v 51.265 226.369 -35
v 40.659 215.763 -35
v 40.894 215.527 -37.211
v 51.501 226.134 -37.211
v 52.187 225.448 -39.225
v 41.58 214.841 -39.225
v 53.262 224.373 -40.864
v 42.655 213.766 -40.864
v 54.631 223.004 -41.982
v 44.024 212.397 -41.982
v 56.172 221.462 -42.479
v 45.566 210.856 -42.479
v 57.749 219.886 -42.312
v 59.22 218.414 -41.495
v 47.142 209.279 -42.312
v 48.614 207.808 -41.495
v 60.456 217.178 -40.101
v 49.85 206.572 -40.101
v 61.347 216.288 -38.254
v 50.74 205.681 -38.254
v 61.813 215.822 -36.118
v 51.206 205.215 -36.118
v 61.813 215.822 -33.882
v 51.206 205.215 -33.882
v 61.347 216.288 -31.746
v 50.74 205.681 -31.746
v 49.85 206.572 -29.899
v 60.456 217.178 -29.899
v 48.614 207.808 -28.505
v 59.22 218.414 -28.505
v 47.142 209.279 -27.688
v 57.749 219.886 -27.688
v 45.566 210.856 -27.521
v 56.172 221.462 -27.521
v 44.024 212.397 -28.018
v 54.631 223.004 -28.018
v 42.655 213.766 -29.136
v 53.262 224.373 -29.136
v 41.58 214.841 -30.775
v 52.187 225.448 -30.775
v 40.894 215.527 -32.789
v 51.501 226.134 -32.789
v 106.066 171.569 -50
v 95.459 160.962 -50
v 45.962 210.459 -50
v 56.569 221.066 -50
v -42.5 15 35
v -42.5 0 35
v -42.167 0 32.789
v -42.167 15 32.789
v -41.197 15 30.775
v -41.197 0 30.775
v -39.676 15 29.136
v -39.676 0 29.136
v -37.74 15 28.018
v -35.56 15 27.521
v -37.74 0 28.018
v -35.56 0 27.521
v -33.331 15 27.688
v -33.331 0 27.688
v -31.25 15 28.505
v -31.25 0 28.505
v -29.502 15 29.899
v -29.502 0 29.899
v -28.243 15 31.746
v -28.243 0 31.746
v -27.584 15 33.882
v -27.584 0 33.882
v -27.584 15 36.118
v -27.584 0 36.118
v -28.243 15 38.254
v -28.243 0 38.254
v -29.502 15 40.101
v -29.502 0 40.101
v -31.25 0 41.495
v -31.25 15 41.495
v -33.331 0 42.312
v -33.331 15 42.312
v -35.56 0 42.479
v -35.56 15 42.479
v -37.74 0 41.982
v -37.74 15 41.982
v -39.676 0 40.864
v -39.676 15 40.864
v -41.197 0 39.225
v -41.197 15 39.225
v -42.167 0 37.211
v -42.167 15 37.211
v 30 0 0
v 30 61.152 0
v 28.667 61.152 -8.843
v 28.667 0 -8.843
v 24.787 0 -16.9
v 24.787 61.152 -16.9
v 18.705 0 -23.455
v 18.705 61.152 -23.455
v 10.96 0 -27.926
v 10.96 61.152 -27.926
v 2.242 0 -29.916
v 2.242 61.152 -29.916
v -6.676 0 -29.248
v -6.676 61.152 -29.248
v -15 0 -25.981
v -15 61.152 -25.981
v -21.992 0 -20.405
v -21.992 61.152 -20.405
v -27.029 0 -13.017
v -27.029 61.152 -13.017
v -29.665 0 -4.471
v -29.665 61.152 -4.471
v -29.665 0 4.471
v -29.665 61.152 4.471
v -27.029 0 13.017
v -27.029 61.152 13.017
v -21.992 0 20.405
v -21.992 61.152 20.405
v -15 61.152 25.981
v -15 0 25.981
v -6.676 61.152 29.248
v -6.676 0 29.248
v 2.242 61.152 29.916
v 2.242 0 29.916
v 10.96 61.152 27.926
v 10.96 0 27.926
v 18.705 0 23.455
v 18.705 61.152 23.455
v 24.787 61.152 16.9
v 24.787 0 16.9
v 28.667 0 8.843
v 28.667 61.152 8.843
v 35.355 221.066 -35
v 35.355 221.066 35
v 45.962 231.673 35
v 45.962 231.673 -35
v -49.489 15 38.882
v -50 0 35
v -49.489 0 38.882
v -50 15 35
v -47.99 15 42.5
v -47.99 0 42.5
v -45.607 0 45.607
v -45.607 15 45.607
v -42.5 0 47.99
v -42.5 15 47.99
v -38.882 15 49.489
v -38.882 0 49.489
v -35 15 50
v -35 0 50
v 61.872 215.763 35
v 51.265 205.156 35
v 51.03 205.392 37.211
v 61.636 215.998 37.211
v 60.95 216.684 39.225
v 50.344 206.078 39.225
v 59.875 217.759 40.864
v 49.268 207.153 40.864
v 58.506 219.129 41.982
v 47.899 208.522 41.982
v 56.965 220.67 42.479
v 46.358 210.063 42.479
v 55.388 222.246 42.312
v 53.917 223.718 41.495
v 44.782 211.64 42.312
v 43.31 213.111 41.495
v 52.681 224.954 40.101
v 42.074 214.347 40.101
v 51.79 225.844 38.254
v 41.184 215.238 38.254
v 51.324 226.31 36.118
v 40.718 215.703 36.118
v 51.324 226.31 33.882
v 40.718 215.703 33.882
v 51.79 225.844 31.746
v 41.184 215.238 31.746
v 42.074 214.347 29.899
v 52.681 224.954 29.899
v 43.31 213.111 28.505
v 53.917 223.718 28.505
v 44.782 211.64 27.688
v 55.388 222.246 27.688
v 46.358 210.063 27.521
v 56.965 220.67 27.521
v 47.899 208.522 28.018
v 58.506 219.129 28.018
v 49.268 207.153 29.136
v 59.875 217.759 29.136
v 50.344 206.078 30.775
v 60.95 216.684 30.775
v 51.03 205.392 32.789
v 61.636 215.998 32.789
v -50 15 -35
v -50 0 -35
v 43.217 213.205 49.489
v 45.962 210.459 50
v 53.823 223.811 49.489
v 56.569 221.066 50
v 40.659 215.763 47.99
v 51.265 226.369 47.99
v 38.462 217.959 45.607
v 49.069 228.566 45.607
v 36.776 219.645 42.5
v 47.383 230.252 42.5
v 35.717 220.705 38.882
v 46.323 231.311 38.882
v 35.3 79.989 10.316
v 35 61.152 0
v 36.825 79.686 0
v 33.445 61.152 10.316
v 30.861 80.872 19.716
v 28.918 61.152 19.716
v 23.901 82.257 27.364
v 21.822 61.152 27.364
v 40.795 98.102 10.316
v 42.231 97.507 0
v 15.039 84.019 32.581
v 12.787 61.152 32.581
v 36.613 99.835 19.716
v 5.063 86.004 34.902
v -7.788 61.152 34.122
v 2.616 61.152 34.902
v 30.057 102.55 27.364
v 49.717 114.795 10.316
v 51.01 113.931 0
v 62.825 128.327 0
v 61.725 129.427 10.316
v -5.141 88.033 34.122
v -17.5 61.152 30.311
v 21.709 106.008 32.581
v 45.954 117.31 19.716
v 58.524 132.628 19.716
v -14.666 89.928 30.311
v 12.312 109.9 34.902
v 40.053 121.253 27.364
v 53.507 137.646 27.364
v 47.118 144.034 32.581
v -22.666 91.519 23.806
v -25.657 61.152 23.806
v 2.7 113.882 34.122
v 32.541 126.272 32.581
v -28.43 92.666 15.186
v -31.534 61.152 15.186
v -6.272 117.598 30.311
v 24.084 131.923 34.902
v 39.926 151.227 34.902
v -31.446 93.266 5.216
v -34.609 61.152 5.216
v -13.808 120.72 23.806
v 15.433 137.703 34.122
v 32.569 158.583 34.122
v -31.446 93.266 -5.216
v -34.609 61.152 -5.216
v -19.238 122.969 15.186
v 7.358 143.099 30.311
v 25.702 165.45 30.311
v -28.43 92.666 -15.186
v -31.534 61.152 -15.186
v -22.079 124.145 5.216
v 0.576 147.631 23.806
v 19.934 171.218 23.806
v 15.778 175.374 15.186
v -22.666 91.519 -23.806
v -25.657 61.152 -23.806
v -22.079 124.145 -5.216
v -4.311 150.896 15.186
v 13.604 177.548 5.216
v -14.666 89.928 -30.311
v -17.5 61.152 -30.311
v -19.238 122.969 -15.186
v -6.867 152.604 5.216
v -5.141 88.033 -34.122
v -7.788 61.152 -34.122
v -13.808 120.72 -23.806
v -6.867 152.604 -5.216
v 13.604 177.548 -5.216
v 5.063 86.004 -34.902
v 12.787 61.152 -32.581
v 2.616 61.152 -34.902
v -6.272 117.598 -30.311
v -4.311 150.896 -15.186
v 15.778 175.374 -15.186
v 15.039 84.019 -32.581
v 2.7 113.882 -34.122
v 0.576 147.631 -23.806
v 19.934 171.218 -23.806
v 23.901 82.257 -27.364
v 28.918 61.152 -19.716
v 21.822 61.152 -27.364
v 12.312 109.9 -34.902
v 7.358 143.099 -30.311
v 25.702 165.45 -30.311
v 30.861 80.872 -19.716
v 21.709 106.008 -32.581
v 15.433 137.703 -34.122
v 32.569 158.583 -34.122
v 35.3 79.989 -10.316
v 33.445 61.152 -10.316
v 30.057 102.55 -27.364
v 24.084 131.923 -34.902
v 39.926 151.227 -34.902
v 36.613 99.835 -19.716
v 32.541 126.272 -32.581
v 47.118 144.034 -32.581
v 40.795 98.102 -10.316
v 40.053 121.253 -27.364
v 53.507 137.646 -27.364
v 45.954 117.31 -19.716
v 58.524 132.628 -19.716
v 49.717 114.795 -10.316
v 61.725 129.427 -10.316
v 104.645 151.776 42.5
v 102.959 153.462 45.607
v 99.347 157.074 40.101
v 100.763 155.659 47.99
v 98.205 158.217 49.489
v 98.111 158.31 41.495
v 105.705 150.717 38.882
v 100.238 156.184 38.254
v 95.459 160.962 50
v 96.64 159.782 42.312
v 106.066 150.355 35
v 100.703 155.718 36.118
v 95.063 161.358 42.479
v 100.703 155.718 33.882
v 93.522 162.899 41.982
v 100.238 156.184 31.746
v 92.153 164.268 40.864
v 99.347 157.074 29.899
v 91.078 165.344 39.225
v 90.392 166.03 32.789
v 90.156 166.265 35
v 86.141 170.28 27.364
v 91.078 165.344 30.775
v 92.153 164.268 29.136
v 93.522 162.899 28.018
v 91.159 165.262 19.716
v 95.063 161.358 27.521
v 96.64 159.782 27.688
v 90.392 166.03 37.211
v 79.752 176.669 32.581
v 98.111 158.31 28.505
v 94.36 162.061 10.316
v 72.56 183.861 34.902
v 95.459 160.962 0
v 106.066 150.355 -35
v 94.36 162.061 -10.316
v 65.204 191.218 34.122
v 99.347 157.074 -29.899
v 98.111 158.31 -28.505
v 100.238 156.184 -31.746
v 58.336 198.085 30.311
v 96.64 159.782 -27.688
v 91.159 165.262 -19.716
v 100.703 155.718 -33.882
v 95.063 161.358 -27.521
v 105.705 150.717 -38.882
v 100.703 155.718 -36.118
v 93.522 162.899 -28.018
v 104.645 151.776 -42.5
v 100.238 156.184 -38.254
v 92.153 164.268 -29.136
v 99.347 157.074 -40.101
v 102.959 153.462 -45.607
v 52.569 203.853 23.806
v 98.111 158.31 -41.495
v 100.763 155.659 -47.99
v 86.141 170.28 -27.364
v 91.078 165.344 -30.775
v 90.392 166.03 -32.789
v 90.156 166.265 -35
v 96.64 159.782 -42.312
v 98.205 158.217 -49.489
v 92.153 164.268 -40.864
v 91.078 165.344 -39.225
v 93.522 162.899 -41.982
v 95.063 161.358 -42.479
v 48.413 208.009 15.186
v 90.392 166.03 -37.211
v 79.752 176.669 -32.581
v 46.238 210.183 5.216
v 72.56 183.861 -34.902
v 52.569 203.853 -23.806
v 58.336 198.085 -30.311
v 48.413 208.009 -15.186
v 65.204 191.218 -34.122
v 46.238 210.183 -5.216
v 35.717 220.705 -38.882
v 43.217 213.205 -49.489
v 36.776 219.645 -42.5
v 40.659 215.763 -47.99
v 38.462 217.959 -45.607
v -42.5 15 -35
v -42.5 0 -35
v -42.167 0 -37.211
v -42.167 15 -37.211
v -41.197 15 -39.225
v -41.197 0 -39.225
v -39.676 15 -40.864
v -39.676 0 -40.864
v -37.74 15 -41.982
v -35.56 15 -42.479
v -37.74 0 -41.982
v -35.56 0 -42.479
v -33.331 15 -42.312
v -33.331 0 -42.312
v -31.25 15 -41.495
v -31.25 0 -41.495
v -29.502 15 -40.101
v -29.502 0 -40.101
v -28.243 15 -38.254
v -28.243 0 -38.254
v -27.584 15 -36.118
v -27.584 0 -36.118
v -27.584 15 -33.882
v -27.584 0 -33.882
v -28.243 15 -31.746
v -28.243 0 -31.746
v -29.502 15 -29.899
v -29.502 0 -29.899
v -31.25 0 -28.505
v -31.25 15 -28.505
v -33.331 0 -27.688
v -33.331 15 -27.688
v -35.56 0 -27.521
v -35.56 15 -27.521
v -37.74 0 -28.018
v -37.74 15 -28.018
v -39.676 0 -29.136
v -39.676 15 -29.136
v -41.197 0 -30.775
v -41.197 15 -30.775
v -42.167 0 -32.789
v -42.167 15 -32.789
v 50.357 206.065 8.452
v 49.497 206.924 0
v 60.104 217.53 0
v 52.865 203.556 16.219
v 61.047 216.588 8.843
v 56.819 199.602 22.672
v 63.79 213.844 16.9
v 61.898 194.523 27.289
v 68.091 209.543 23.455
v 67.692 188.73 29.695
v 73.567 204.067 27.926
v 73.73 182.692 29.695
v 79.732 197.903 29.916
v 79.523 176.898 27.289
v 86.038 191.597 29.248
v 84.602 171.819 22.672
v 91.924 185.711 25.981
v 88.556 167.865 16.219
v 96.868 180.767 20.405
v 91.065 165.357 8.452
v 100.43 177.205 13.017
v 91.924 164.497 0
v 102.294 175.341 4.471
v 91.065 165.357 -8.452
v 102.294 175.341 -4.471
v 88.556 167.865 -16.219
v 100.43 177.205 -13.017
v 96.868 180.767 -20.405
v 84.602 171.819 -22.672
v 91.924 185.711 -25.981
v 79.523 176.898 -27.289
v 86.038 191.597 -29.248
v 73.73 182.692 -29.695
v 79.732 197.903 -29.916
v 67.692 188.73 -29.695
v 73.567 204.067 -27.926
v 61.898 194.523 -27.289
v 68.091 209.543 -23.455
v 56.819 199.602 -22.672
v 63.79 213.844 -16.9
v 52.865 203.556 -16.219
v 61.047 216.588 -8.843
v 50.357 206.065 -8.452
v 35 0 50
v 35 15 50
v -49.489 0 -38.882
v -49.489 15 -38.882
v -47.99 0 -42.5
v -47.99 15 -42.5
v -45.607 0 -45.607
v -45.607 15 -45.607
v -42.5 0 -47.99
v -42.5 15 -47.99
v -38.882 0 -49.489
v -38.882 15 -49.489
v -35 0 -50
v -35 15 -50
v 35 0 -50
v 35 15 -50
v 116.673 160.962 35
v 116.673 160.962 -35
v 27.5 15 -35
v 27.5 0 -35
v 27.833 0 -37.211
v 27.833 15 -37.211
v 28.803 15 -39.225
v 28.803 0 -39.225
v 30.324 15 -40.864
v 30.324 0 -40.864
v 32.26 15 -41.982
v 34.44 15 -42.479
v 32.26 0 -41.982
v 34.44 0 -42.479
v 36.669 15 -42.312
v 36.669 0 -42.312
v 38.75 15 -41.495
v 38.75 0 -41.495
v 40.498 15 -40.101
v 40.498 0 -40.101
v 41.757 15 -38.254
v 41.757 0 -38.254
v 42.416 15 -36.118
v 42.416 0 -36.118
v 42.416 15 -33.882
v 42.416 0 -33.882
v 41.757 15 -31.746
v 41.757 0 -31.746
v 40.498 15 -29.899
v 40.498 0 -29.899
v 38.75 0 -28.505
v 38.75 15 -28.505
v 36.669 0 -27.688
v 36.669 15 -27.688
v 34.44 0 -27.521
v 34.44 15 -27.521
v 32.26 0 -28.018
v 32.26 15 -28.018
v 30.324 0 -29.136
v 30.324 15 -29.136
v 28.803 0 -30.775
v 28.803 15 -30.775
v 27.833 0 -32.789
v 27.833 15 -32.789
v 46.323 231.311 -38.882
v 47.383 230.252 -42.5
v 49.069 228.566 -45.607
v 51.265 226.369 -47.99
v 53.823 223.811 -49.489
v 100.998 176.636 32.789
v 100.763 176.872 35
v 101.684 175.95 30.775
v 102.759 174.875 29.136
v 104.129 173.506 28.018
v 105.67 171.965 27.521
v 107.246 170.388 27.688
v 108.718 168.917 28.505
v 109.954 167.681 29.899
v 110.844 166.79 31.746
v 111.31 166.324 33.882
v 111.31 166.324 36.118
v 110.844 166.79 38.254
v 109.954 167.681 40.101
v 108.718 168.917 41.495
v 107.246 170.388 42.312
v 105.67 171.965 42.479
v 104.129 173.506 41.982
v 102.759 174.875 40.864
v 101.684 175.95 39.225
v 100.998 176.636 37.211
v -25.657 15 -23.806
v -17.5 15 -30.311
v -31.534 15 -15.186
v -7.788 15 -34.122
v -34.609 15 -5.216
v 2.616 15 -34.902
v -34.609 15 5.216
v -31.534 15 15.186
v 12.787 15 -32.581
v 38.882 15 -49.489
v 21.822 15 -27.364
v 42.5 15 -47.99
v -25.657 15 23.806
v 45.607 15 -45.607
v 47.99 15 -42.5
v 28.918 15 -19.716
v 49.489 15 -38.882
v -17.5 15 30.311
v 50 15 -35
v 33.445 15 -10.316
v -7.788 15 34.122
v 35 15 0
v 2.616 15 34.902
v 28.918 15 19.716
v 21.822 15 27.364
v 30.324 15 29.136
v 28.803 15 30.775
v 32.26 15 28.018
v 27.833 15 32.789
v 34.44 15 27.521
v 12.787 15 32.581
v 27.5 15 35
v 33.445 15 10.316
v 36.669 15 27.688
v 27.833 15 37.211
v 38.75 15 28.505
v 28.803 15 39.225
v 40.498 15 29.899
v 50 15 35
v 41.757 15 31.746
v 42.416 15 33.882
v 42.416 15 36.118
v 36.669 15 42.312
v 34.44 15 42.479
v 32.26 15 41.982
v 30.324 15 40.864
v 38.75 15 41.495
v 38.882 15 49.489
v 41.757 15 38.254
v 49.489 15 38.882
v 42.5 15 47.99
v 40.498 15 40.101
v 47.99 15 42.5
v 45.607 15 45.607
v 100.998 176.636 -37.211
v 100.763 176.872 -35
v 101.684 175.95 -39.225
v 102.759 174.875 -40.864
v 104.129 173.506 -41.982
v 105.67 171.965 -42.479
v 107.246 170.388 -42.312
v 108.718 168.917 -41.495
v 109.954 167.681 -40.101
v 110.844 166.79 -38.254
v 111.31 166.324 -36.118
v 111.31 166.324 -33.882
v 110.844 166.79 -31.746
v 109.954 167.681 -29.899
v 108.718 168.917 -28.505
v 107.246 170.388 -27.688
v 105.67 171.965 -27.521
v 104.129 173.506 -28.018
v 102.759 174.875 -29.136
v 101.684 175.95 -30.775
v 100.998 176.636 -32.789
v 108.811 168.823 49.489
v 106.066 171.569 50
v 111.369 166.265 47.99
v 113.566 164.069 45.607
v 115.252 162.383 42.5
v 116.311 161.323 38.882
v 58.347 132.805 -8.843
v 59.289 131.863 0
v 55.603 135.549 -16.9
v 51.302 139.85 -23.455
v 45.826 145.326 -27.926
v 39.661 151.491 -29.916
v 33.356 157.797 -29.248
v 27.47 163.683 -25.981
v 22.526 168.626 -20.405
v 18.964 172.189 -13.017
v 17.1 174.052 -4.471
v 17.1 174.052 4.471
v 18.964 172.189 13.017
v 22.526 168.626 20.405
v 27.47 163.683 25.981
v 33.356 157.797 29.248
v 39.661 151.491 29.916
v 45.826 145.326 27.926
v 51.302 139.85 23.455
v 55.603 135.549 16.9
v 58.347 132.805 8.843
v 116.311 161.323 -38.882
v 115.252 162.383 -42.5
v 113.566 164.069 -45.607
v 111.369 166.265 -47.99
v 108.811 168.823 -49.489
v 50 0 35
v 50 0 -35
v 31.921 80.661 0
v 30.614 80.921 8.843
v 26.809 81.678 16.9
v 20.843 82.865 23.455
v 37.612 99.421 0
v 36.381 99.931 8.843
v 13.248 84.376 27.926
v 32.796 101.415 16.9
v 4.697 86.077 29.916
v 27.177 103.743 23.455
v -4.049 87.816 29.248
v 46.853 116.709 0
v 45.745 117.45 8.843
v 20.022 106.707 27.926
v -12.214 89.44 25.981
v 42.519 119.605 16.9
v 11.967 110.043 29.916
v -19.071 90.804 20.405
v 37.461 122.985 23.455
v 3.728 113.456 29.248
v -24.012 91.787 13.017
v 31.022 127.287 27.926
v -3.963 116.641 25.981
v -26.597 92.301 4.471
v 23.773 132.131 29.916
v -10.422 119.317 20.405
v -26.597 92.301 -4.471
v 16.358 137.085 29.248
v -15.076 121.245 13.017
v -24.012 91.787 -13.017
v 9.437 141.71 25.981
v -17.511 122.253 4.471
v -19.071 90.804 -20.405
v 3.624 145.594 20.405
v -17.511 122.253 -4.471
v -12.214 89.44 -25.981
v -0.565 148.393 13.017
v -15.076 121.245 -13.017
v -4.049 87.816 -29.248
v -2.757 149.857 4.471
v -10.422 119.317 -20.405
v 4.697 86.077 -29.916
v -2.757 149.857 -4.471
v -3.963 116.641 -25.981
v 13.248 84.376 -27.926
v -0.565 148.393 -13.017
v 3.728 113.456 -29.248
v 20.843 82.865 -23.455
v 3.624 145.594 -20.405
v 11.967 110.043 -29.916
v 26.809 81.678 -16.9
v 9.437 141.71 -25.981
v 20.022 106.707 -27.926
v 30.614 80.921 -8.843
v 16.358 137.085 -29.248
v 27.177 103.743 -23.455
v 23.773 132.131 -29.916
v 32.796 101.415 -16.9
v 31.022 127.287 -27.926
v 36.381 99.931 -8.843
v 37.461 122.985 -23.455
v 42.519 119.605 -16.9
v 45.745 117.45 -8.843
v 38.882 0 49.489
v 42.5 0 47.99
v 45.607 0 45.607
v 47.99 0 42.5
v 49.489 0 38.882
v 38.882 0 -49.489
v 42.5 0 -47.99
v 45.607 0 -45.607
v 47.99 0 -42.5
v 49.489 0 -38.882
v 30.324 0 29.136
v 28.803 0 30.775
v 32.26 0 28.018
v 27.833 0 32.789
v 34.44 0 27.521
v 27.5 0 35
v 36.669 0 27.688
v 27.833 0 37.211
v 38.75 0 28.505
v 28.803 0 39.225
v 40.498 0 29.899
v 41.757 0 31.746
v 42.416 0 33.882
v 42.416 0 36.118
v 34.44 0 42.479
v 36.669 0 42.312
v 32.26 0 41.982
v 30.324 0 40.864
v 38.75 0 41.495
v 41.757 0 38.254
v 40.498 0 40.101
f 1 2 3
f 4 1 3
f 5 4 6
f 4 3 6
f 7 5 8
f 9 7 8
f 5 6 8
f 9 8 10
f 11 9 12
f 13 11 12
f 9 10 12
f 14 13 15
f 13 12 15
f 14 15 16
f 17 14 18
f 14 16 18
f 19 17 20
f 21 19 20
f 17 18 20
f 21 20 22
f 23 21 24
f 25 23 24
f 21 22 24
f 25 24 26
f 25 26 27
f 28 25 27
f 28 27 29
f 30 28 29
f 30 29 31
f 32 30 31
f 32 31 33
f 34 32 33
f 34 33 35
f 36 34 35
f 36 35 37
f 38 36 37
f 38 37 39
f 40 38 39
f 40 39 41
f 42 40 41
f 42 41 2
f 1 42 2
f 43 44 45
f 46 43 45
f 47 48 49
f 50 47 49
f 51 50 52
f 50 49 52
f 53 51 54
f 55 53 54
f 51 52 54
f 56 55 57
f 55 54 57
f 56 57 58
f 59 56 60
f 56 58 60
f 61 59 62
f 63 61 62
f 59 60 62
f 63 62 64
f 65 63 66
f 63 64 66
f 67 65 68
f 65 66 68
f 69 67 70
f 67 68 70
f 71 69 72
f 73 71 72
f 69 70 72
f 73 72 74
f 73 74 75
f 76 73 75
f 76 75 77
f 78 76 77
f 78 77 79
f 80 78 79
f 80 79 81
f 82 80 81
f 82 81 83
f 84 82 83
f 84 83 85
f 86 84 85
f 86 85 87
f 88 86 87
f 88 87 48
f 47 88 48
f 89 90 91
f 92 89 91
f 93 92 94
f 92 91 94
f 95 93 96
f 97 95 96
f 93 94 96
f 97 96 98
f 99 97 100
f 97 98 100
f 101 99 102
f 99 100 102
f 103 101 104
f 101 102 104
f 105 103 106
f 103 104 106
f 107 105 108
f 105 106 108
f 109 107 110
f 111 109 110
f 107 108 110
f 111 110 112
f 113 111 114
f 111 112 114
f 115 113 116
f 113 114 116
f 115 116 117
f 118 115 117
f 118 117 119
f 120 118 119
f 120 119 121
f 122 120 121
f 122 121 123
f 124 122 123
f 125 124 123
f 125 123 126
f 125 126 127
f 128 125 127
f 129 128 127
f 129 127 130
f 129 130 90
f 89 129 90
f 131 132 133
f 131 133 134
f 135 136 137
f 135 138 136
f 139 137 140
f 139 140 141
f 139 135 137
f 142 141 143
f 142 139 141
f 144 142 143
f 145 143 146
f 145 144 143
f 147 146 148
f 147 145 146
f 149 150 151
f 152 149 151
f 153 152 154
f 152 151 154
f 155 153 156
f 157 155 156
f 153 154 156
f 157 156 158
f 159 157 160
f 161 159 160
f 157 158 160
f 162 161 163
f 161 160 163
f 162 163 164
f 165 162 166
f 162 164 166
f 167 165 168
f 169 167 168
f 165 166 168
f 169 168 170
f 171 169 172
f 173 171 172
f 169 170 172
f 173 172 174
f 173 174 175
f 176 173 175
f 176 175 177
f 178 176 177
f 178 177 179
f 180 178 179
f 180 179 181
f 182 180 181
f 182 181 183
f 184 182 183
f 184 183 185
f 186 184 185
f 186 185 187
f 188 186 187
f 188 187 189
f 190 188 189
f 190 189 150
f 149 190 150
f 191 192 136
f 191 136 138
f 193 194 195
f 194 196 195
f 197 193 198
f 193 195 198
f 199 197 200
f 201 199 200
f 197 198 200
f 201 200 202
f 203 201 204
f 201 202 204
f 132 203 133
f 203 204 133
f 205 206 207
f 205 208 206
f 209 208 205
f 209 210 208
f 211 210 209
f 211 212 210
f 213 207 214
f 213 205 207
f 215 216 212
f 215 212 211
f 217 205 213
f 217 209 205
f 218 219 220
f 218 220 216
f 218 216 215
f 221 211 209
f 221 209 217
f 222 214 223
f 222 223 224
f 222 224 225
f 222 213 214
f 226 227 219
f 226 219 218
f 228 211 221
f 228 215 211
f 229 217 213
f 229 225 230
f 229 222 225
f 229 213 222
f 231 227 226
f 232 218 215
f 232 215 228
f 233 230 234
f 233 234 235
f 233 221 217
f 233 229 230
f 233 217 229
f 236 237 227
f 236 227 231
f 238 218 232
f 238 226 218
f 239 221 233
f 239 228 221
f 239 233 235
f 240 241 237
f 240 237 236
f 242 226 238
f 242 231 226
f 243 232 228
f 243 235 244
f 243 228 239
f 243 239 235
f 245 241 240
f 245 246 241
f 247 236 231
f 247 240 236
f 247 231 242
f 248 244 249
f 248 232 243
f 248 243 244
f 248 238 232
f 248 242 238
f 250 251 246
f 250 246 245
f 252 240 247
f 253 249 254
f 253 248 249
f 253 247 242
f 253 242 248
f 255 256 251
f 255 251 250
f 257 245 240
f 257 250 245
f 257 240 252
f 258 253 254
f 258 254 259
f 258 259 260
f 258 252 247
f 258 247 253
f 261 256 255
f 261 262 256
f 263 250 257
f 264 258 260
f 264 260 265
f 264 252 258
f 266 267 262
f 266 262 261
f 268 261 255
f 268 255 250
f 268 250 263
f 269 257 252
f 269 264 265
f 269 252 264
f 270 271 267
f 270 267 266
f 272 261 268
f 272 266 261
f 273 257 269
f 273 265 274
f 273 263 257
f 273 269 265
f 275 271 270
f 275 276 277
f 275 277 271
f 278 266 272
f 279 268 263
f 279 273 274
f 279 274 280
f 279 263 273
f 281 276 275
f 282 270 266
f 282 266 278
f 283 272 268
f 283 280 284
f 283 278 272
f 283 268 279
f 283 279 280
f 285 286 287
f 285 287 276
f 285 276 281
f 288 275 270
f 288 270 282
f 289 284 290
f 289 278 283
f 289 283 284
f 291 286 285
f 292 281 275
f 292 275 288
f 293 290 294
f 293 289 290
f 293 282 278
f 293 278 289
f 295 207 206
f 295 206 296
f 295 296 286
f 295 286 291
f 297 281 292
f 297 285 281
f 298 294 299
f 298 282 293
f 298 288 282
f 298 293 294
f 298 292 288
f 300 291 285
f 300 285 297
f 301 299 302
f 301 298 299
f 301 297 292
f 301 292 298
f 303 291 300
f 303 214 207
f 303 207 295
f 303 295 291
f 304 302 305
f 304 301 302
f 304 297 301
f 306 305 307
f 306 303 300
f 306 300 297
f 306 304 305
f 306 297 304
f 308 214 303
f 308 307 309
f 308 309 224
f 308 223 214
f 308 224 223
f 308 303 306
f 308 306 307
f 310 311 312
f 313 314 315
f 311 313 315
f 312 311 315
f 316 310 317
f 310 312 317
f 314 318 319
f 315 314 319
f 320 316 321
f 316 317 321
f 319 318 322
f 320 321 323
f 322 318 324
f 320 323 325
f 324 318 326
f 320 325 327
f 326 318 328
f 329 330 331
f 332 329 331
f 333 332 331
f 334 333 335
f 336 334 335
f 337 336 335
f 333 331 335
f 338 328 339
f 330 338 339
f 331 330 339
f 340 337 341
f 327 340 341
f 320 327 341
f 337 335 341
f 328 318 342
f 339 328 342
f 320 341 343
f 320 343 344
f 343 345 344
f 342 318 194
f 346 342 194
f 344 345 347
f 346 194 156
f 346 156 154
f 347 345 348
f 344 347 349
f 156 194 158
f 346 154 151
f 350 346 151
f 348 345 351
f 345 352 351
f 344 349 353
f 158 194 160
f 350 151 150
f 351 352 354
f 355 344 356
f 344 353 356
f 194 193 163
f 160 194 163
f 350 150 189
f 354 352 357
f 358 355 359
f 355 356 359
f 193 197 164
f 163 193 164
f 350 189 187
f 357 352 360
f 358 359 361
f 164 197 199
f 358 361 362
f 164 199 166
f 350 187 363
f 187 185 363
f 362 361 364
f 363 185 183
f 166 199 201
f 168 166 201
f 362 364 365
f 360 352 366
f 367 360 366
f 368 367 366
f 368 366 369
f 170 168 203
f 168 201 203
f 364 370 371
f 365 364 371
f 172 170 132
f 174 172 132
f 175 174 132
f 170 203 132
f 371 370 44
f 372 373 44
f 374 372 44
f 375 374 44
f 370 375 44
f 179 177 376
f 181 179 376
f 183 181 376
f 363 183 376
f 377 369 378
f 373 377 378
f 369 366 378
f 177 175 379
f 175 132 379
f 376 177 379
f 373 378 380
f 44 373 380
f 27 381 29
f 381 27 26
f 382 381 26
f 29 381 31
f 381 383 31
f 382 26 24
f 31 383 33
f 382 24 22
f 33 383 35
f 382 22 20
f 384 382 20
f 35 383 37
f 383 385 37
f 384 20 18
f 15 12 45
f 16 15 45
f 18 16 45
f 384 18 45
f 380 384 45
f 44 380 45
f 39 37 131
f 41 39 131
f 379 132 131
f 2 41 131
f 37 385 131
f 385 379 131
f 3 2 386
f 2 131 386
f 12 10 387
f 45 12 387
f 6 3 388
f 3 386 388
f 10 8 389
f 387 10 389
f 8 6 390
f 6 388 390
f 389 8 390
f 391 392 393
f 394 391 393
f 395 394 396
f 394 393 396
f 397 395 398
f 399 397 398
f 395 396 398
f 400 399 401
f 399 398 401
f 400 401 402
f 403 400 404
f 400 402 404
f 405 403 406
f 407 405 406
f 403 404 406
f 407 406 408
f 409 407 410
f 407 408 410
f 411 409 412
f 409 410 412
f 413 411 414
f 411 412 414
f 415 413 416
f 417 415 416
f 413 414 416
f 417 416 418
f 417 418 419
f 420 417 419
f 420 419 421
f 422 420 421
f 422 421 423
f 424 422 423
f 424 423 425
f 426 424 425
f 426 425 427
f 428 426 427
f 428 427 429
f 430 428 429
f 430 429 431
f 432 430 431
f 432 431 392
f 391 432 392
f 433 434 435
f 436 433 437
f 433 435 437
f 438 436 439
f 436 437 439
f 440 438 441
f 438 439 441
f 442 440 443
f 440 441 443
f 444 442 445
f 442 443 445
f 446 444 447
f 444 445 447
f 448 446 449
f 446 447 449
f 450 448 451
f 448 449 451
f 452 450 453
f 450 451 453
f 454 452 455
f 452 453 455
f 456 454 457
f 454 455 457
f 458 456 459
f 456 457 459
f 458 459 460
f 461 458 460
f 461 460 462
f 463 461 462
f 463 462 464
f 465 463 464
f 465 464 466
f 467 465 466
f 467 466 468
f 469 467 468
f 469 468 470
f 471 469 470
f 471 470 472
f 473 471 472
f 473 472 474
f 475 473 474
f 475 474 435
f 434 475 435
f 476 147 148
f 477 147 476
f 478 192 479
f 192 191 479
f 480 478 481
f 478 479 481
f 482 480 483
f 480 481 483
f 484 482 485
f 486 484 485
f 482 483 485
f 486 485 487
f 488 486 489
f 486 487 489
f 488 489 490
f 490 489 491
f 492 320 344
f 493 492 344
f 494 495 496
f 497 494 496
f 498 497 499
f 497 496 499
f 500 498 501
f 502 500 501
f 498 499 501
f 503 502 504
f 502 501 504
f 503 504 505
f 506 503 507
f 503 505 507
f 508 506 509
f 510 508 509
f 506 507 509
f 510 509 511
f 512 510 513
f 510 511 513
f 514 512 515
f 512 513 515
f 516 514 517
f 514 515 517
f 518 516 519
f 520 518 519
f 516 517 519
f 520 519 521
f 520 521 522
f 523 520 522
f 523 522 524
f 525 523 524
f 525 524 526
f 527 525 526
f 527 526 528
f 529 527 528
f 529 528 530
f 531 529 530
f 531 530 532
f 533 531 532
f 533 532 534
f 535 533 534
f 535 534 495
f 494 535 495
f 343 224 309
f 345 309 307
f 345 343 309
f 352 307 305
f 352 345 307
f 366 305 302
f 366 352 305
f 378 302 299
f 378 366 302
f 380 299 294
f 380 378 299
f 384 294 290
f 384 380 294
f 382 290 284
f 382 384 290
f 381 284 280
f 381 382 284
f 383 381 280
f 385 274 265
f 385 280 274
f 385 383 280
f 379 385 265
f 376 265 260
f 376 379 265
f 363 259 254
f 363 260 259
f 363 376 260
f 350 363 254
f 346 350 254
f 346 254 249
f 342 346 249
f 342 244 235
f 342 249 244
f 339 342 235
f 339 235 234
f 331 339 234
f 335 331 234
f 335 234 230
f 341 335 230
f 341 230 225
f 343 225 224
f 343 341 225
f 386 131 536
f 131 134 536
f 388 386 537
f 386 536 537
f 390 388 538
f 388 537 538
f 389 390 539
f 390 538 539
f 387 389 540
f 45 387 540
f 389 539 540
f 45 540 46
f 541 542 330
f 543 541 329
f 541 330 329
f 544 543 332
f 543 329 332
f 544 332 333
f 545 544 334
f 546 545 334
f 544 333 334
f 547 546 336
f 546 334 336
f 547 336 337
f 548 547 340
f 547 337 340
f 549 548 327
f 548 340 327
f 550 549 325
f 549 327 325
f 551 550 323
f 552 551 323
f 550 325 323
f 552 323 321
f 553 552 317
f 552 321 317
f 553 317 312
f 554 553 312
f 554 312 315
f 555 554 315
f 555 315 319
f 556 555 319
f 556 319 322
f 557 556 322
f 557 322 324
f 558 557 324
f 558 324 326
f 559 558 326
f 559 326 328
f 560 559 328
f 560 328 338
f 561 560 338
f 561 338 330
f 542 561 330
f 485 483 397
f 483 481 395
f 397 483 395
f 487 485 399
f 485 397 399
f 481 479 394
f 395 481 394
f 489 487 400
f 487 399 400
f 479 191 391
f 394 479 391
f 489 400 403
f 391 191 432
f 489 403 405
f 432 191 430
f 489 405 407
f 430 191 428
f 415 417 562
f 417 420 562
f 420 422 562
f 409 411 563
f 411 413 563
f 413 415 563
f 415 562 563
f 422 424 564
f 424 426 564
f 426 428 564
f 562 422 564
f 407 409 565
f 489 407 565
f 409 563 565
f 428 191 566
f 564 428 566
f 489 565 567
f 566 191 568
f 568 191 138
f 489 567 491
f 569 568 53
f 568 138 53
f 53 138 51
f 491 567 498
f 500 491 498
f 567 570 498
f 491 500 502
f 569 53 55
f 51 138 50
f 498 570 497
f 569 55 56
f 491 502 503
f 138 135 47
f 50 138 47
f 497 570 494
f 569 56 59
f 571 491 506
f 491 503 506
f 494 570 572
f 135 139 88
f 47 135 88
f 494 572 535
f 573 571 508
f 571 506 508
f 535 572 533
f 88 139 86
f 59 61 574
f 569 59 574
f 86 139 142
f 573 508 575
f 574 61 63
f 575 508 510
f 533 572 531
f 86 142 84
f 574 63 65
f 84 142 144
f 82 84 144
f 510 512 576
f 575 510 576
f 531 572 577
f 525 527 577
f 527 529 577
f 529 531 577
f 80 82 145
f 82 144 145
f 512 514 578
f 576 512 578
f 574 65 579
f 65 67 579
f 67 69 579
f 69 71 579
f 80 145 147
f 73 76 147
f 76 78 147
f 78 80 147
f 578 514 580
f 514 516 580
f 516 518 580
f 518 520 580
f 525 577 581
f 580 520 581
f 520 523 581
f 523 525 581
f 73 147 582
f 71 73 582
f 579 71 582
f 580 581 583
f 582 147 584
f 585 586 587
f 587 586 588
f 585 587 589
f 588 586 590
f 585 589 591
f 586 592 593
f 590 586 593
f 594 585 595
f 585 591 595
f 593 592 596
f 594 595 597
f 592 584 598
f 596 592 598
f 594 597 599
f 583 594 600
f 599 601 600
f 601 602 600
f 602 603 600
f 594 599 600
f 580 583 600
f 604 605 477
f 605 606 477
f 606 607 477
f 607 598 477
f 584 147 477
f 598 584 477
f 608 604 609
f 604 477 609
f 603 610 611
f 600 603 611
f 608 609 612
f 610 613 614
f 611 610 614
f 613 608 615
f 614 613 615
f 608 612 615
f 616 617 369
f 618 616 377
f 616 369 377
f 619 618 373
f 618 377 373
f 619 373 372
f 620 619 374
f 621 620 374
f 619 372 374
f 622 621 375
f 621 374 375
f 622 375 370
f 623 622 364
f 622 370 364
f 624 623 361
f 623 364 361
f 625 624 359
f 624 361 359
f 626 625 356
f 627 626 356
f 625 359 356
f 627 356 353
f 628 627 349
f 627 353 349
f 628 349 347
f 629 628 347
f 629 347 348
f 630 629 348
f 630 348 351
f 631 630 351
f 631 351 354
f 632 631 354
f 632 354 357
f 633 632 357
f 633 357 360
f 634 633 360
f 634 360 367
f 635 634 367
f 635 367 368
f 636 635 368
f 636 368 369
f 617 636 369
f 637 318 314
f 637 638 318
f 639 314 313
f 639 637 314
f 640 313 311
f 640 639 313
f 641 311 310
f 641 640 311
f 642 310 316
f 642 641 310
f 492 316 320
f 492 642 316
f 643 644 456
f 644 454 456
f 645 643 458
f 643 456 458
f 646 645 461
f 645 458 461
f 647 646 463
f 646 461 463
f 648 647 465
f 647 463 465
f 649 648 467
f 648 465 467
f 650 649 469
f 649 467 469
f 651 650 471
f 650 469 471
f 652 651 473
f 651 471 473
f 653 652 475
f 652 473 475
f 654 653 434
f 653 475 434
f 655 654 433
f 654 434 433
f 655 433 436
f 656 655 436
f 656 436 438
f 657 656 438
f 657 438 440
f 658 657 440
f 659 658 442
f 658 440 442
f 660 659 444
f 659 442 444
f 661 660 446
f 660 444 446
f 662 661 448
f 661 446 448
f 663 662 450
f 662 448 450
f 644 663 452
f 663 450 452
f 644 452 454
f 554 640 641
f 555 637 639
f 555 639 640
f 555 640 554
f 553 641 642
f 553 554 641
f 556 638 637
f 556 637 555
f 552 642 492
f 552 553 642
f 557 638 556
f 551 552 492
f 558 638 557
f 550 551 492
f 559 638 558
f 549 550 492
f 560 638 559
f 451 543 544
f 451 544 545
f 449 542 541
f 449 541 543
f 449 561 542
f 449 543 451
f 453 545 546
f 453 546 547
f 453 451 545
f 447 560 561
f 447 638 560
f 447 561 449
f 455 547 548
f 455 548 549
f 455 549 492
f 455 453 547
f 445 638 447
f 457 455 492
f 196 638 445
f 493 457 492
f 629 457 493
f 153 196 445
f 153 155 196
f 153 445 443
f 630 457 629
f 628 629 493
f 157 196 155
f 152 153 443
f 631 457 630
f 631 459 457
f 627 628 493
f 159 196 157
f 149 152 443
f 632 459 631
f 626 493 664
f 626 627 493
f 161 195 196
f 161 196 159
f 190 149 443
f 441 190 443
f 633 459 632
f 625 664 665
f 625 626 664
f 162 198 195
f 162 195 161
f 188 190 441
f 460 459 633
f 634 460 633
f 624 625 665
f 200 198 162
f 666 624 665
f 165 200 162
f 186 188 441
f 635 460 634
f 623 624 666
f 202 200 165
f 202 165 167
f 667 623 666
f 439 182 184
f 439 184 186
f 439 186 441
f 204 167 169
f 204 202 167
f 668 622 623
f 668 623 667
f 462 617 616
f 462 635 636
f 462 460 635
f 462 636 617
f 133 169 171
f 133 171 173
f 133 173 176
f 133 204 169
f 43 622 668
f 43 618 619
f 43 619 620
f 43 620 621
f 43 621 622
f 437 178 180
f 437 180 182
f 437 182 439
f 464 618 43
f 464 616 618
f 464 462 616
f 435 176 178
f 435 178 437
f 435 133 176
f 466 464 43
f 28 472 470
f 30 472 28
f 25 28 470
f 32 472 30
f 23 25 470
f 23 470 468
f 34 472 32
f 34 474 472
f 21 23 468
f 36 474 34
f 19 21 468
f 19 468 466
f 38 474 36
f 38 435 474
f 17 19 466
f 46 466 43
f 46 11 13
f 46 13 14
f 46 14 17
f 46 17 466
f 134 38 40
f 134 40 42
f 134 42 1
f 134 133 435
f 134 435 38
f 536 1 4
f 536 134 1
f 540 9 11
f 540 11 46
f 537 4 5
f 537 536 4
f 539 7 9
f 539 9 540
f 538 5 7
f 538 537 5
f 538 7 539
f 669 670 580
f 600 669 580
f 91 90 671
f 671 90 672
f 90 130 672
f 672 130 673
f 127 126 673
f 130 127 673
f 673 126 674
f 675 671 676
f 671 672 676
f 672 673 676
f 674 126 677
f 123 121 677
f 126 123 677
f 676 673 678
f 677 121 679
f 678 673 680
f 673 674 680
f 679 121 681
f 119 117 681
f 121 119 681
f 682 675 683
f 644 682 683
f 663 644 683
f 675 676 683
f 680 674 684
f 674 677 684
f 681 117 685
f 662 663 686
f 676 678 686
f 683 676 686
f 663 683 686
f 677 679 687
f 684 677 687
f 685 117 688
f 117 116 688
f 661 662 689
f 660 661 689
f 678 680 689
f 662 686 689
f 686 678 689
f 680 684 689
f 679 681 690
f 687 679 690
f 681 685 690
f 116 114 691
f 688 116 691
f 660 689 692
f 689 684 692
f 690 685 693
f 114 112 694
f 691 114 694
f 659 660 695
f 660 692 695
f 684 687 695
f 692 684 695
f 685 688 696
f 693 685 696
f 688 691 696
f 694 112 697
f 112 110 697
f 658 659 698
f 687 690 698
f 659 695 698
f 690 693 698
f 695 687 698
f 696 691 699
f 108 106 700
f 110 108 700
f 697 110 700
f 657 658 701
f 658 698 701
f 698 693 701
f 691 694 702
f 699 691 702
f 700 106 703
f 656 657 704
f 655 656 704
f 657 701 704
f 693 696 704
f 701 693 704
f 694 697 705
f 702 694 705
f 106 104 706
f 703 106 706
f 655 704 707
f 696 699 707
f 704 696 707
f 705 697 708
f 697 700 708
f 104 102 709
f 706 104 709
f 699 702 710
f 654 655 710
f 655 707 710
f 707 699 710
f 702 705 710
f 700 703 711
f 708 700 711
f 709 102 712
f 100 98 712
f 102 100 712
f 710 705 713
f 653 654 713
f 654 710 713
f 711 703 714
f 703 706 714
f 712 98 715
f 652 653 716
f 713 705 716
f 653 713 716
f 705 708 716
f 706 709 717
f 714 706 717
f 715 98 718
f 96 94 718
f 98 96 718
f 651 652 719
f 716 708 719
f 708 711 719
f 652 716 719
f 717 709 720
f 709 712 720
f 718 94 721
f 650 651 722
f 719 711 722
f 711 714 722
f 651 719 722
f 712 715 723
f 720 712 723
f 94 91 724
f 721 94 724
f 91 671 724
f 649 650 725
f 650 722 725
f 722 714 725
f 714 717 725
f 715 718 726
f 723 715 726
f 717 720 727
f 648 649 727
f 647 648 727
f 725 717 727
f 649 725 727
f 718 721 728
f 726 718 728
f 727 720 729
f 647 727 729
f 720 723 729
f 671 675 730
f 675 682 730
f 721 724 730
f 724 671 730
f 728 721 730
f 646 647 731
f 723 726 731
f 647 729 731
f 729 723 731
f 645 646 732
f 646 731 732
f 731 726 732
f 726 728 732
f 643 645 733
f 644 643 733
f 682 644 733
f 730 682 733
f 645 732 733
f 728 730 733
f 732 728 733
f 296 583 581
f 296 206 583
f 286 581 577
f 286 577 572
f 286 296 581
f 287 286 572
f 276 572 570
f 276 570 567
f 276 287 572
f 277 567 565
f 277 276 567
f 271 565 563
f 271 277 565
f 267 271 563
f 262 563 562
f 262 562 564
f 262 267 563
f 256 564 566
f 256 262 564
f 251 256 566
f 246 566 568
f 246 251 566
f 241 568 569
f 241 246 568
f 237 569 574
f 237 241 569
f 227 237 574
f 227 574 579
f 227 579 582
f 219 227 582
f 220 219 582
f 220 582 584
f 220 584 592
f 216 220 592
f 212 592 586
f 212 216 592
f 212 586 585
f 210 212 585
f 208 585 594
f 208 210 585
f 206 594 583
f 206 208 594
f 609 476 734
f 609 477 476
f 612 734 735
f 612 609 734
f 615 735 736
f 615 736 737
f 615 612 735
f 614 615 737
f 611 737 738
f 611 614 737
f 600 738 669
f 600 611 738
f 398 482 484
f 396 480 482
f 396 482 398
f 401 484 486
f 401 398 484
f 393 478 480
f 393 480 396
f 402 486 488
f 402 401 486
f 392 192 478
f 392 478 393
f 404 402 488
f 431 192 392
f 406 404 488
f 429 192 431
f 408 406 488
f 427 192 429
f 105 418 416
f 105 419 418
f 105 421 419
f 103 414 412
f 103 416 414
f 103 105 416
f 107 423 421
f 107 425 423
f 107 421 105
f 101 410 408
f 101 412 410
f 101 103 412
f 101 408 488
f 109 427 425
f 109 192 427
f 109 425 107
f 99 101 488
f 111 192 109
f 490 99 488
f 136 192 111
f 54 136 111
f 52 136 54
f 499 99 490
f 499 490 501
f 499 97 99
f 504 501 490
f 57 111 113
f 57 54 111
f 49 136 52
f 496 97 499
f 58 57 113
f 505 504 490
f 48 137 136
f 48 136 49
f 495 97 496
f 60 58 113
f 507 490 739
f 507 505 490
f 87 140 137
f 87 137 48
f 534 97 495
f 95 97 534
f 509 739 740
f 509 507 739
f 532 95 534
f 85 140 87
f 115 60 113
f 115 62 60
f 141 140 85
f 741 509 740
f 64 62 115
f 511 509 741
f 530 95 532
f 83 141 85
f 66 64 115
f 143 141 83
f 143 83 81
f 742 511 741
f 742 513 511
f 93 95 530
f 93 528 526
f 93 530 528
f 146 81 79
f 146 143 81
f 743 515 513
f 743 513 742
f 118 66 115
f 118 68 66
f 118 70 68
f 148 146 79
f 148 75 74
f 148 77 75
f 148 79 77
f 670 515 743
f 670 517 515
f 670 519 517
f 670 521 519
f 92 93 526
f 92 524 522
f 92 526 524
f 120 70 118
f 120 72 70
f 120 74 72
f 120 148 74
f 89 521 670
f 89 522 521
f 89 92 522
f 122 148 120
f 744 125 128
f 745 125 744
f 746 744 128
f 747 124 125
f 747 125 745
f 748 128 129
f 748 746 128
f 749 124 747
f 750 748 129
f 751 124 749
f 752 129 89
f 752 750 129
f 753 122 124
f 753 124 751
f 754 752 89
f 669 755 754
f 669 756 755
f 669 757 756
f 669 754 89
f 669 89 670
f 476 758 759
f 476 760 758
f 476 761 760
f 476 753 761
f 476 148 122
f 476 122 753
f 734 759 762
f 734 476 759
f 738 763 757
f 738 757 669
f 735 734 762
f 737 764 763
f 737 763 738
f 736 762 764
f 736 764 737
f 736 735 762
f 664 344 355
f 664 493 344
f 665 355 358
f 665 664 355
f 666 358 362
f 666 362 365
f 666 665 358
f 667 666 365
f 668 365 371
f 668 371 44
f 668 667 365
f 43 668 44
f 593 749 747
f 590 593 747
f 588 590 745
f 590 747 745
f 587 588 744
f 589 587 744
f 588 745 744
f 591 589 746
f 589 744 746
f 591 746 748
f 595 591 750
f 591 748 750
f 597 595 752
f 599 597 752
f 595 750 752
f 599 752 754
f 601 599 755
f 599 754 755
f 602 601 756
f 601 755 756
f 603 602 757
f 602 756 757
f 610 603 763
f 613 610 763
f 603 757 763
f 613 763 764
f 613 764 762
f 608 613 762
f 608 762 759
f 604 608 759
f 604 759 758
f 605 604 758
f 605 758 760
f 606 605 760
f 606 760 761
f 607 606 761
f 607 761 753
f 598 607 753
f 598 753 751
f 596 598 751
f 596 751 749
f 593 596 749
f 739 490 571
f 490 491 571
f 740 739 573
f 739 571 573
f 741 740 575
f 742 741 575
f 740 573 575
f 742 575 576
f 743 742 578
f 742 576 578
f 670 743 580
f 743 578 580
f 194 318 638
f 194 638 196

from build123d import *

# Parameters (mm, degrees)
CROQUIS1_W               = 100
CROQUIS1_H               = 15
SALIENTE_EXTRUIR1_DEPTH  = 50
CROQUIS17_R              = 30
CORTAR_EXTRUIR1_DEPTH    = 15
BARRER1_PROFILE_R        = 35
CORTAR_BARRER2_PROFILE_R = 30
REDONDEO1_R              = 15
TALADRO1_D               = 15
TALADRO1_DEPTH           = 15
CROQUIS26_W              = 100
CROQUIS26_H              = 100
SALIENTE_EXTRUIR3_DEPTH  = 15
REDONDEO2_R              = 15
CROQUIS29_R              = 30
CORTAR_EXTRUIR2_DEPTH    = 15
TALADRO2_D               = 15
TALADRO2_DEPTH           = 15
TALADRO2_ON_FACE_2_D     = 15
TALADRO2_ON_FACE_2_DEPTH = 15


with BuildPart() as part:
    # Croquis1 → Saliente-Extruir1 (new, symmetric)
    with BuildSketch(Plane.XY):
        with Locations((0, 7.5)):
            Rectangle(CROQUIS1_W, CROQUIS1_H)
    extrude(amount=SALIENTE_EXTRUIR1_DEPTH, both=True)

    # Croquis17 → Cortar-Extruir1 (cut)
    with BuildSketch(Plane(origin=(0, 15, 0), x_dir=(1, 0, 0), z_dir=(0, 1, 0))):
        with Locations(Location((0, 0, 0), (0, 0, 180))):
            Circle(CROQUIS17_R)
    extrude(amount=-CORTAR_EXTRUIR1_DEPTH, mode=Mode.SUBTRACT)

    # Barrer1: sweep along a path in Croquis2
    with BuildLine(Plane.XY) as barrer1_path:
        Line((0, 0), (0, 61.152236891))
        ThreePointArc((0, 61.152236891), (9.895660774, 110.901083099), (38.076118446, 153.076118446))
        Line((38.076118446, 153.076118446), (70.710678119, 185.710678119))
    # Barrer1 profile (on start of the path) → Barrer1 (sweep)
    with BuildSketch(Plane(origin=(0, 0, 0), x_dir=(1, 0, 0), z_dir=(0, 1, 0))):
        Circle(BARRER1_PROFILE_R)
    sweep(path=barrer1_path.line)

    # Cortar-Barrer2: sweep along a path in Croquis2<5>
    with BuildLine(Plane.XY) as cortar_barrer2_path:
        Line((0, 0), (0, 61.152236891))
        ThreePointArc((0, 61.152236891), (9.895660774, 110.901083099), (38.076118446, 153.076118446))
        Line((38.076118446, 153.076118446), (70.710678119, 185.710678119))
    # Cortar-Barrer2 profile (on start of the path) → Cortar-Barrer2 (sweep, cut)
    with BuildSketch(Plane(origin=(0, 0, 0), x_dir=(1, 0, 0), z_dir=(0, 1, 0))):
        Circle(CORTAR_BARRER2_PROFILE_R)
    sweep(path=cortar_barrer2_path.line, mode=Mode.SUBTRACT)

    # Redondeo1
    redondeo1_edges = [part.edges().sort_by_distance(p)[0] for p in [
        (50, 7.5, 50),
        (-50, 7.5, 50),
        (50, 7.5, -50),
        (-50, 7.5, -50),
    ]]
    fillet(redondeo1_edges, radius=REDONDEO1_R)

    # Taladro1
    with Locations(Plane(origin=(-35, 15, -35), x_dir=(1, 0, 0), z_dir=(0, 1, 0))):
        with Locations((0, 0), (0, -70), (70, 0), (70, -70)):
            Hole(TALADRO1_D / 2, depth=TALADRO1_DEPTH)

    # Croquis26 → Saliente-Extruir3 (add)
    with BuildSketch(Plane(origin=(128.210678119, 128.210678119, 0), x_dir=(0, 0, -1), z_dir=(0.7071067811865478, 0.7071067811865472, 0))):
        with Locations((0, 81.317279836)):
            Rectangle(CROQUIS26_W, CROQUIS26_H)
    extrude(amount=SALIENTE_EXTRUIR3_DEPTH)

    # Redondeo2
    redondeo2_edges = [part.edges().sort_by_distance(p)[0] for p in [
        (40.658639918, 226.369318037, 50),
        (111.369318037, 155.658639918, 50),
        (111.369318037, 155.658639918, -50),
        (40.658639918, 226.369318037, -50),
    ]]
    fillet(redondeo2_edges, radius=REDONDEO2_R)

    # Croquis29 → Cortar-Extruir2 (cut)
    with BuildSketch(Plane(origin=(138.817279836, 138.817279836, 0), x_dir=(0, 0, -1), z_dir=(0.7071067811865479, 0.7071067811865472, 0))):
        with Locations(Location((0, 81.317279836, 0), (0, 0, 90))):
            Circle(CROQUIS29_R)
    extrude(amount=-CORTAR_EXTRUIR2_DEPTH, mode=Mode.SUBTRACT)

    # Taladro2
    with Locations(Plane(origin=(56.568542495, 221.066017178, 35), x_dir=(-0.707106781187, 0.707106781187, 0), z_dir=(0.707106781187, 0.707106781187, 0))):
        with Locations((0, 0)):
            Hole(TALADRO2_D / 2, depth=TALADRO2_DEPTH)

    # Taladro2 on face 2
    with Locations(Plane(origin=(106.066017178, 171.568542495, 35), x_dir=(0.707106781187, -0.707106781187, 0), z_dir=(0.707106781187, 0.707106781187, 0))):
        with Locations((0, 0), (0, 70), (-70, 70)):
            Hole(TALADRO2_ON_FACE_2_D / 2, depth=TALADRO2_ON_FACE_2_DEPTH)


solid = part.part
